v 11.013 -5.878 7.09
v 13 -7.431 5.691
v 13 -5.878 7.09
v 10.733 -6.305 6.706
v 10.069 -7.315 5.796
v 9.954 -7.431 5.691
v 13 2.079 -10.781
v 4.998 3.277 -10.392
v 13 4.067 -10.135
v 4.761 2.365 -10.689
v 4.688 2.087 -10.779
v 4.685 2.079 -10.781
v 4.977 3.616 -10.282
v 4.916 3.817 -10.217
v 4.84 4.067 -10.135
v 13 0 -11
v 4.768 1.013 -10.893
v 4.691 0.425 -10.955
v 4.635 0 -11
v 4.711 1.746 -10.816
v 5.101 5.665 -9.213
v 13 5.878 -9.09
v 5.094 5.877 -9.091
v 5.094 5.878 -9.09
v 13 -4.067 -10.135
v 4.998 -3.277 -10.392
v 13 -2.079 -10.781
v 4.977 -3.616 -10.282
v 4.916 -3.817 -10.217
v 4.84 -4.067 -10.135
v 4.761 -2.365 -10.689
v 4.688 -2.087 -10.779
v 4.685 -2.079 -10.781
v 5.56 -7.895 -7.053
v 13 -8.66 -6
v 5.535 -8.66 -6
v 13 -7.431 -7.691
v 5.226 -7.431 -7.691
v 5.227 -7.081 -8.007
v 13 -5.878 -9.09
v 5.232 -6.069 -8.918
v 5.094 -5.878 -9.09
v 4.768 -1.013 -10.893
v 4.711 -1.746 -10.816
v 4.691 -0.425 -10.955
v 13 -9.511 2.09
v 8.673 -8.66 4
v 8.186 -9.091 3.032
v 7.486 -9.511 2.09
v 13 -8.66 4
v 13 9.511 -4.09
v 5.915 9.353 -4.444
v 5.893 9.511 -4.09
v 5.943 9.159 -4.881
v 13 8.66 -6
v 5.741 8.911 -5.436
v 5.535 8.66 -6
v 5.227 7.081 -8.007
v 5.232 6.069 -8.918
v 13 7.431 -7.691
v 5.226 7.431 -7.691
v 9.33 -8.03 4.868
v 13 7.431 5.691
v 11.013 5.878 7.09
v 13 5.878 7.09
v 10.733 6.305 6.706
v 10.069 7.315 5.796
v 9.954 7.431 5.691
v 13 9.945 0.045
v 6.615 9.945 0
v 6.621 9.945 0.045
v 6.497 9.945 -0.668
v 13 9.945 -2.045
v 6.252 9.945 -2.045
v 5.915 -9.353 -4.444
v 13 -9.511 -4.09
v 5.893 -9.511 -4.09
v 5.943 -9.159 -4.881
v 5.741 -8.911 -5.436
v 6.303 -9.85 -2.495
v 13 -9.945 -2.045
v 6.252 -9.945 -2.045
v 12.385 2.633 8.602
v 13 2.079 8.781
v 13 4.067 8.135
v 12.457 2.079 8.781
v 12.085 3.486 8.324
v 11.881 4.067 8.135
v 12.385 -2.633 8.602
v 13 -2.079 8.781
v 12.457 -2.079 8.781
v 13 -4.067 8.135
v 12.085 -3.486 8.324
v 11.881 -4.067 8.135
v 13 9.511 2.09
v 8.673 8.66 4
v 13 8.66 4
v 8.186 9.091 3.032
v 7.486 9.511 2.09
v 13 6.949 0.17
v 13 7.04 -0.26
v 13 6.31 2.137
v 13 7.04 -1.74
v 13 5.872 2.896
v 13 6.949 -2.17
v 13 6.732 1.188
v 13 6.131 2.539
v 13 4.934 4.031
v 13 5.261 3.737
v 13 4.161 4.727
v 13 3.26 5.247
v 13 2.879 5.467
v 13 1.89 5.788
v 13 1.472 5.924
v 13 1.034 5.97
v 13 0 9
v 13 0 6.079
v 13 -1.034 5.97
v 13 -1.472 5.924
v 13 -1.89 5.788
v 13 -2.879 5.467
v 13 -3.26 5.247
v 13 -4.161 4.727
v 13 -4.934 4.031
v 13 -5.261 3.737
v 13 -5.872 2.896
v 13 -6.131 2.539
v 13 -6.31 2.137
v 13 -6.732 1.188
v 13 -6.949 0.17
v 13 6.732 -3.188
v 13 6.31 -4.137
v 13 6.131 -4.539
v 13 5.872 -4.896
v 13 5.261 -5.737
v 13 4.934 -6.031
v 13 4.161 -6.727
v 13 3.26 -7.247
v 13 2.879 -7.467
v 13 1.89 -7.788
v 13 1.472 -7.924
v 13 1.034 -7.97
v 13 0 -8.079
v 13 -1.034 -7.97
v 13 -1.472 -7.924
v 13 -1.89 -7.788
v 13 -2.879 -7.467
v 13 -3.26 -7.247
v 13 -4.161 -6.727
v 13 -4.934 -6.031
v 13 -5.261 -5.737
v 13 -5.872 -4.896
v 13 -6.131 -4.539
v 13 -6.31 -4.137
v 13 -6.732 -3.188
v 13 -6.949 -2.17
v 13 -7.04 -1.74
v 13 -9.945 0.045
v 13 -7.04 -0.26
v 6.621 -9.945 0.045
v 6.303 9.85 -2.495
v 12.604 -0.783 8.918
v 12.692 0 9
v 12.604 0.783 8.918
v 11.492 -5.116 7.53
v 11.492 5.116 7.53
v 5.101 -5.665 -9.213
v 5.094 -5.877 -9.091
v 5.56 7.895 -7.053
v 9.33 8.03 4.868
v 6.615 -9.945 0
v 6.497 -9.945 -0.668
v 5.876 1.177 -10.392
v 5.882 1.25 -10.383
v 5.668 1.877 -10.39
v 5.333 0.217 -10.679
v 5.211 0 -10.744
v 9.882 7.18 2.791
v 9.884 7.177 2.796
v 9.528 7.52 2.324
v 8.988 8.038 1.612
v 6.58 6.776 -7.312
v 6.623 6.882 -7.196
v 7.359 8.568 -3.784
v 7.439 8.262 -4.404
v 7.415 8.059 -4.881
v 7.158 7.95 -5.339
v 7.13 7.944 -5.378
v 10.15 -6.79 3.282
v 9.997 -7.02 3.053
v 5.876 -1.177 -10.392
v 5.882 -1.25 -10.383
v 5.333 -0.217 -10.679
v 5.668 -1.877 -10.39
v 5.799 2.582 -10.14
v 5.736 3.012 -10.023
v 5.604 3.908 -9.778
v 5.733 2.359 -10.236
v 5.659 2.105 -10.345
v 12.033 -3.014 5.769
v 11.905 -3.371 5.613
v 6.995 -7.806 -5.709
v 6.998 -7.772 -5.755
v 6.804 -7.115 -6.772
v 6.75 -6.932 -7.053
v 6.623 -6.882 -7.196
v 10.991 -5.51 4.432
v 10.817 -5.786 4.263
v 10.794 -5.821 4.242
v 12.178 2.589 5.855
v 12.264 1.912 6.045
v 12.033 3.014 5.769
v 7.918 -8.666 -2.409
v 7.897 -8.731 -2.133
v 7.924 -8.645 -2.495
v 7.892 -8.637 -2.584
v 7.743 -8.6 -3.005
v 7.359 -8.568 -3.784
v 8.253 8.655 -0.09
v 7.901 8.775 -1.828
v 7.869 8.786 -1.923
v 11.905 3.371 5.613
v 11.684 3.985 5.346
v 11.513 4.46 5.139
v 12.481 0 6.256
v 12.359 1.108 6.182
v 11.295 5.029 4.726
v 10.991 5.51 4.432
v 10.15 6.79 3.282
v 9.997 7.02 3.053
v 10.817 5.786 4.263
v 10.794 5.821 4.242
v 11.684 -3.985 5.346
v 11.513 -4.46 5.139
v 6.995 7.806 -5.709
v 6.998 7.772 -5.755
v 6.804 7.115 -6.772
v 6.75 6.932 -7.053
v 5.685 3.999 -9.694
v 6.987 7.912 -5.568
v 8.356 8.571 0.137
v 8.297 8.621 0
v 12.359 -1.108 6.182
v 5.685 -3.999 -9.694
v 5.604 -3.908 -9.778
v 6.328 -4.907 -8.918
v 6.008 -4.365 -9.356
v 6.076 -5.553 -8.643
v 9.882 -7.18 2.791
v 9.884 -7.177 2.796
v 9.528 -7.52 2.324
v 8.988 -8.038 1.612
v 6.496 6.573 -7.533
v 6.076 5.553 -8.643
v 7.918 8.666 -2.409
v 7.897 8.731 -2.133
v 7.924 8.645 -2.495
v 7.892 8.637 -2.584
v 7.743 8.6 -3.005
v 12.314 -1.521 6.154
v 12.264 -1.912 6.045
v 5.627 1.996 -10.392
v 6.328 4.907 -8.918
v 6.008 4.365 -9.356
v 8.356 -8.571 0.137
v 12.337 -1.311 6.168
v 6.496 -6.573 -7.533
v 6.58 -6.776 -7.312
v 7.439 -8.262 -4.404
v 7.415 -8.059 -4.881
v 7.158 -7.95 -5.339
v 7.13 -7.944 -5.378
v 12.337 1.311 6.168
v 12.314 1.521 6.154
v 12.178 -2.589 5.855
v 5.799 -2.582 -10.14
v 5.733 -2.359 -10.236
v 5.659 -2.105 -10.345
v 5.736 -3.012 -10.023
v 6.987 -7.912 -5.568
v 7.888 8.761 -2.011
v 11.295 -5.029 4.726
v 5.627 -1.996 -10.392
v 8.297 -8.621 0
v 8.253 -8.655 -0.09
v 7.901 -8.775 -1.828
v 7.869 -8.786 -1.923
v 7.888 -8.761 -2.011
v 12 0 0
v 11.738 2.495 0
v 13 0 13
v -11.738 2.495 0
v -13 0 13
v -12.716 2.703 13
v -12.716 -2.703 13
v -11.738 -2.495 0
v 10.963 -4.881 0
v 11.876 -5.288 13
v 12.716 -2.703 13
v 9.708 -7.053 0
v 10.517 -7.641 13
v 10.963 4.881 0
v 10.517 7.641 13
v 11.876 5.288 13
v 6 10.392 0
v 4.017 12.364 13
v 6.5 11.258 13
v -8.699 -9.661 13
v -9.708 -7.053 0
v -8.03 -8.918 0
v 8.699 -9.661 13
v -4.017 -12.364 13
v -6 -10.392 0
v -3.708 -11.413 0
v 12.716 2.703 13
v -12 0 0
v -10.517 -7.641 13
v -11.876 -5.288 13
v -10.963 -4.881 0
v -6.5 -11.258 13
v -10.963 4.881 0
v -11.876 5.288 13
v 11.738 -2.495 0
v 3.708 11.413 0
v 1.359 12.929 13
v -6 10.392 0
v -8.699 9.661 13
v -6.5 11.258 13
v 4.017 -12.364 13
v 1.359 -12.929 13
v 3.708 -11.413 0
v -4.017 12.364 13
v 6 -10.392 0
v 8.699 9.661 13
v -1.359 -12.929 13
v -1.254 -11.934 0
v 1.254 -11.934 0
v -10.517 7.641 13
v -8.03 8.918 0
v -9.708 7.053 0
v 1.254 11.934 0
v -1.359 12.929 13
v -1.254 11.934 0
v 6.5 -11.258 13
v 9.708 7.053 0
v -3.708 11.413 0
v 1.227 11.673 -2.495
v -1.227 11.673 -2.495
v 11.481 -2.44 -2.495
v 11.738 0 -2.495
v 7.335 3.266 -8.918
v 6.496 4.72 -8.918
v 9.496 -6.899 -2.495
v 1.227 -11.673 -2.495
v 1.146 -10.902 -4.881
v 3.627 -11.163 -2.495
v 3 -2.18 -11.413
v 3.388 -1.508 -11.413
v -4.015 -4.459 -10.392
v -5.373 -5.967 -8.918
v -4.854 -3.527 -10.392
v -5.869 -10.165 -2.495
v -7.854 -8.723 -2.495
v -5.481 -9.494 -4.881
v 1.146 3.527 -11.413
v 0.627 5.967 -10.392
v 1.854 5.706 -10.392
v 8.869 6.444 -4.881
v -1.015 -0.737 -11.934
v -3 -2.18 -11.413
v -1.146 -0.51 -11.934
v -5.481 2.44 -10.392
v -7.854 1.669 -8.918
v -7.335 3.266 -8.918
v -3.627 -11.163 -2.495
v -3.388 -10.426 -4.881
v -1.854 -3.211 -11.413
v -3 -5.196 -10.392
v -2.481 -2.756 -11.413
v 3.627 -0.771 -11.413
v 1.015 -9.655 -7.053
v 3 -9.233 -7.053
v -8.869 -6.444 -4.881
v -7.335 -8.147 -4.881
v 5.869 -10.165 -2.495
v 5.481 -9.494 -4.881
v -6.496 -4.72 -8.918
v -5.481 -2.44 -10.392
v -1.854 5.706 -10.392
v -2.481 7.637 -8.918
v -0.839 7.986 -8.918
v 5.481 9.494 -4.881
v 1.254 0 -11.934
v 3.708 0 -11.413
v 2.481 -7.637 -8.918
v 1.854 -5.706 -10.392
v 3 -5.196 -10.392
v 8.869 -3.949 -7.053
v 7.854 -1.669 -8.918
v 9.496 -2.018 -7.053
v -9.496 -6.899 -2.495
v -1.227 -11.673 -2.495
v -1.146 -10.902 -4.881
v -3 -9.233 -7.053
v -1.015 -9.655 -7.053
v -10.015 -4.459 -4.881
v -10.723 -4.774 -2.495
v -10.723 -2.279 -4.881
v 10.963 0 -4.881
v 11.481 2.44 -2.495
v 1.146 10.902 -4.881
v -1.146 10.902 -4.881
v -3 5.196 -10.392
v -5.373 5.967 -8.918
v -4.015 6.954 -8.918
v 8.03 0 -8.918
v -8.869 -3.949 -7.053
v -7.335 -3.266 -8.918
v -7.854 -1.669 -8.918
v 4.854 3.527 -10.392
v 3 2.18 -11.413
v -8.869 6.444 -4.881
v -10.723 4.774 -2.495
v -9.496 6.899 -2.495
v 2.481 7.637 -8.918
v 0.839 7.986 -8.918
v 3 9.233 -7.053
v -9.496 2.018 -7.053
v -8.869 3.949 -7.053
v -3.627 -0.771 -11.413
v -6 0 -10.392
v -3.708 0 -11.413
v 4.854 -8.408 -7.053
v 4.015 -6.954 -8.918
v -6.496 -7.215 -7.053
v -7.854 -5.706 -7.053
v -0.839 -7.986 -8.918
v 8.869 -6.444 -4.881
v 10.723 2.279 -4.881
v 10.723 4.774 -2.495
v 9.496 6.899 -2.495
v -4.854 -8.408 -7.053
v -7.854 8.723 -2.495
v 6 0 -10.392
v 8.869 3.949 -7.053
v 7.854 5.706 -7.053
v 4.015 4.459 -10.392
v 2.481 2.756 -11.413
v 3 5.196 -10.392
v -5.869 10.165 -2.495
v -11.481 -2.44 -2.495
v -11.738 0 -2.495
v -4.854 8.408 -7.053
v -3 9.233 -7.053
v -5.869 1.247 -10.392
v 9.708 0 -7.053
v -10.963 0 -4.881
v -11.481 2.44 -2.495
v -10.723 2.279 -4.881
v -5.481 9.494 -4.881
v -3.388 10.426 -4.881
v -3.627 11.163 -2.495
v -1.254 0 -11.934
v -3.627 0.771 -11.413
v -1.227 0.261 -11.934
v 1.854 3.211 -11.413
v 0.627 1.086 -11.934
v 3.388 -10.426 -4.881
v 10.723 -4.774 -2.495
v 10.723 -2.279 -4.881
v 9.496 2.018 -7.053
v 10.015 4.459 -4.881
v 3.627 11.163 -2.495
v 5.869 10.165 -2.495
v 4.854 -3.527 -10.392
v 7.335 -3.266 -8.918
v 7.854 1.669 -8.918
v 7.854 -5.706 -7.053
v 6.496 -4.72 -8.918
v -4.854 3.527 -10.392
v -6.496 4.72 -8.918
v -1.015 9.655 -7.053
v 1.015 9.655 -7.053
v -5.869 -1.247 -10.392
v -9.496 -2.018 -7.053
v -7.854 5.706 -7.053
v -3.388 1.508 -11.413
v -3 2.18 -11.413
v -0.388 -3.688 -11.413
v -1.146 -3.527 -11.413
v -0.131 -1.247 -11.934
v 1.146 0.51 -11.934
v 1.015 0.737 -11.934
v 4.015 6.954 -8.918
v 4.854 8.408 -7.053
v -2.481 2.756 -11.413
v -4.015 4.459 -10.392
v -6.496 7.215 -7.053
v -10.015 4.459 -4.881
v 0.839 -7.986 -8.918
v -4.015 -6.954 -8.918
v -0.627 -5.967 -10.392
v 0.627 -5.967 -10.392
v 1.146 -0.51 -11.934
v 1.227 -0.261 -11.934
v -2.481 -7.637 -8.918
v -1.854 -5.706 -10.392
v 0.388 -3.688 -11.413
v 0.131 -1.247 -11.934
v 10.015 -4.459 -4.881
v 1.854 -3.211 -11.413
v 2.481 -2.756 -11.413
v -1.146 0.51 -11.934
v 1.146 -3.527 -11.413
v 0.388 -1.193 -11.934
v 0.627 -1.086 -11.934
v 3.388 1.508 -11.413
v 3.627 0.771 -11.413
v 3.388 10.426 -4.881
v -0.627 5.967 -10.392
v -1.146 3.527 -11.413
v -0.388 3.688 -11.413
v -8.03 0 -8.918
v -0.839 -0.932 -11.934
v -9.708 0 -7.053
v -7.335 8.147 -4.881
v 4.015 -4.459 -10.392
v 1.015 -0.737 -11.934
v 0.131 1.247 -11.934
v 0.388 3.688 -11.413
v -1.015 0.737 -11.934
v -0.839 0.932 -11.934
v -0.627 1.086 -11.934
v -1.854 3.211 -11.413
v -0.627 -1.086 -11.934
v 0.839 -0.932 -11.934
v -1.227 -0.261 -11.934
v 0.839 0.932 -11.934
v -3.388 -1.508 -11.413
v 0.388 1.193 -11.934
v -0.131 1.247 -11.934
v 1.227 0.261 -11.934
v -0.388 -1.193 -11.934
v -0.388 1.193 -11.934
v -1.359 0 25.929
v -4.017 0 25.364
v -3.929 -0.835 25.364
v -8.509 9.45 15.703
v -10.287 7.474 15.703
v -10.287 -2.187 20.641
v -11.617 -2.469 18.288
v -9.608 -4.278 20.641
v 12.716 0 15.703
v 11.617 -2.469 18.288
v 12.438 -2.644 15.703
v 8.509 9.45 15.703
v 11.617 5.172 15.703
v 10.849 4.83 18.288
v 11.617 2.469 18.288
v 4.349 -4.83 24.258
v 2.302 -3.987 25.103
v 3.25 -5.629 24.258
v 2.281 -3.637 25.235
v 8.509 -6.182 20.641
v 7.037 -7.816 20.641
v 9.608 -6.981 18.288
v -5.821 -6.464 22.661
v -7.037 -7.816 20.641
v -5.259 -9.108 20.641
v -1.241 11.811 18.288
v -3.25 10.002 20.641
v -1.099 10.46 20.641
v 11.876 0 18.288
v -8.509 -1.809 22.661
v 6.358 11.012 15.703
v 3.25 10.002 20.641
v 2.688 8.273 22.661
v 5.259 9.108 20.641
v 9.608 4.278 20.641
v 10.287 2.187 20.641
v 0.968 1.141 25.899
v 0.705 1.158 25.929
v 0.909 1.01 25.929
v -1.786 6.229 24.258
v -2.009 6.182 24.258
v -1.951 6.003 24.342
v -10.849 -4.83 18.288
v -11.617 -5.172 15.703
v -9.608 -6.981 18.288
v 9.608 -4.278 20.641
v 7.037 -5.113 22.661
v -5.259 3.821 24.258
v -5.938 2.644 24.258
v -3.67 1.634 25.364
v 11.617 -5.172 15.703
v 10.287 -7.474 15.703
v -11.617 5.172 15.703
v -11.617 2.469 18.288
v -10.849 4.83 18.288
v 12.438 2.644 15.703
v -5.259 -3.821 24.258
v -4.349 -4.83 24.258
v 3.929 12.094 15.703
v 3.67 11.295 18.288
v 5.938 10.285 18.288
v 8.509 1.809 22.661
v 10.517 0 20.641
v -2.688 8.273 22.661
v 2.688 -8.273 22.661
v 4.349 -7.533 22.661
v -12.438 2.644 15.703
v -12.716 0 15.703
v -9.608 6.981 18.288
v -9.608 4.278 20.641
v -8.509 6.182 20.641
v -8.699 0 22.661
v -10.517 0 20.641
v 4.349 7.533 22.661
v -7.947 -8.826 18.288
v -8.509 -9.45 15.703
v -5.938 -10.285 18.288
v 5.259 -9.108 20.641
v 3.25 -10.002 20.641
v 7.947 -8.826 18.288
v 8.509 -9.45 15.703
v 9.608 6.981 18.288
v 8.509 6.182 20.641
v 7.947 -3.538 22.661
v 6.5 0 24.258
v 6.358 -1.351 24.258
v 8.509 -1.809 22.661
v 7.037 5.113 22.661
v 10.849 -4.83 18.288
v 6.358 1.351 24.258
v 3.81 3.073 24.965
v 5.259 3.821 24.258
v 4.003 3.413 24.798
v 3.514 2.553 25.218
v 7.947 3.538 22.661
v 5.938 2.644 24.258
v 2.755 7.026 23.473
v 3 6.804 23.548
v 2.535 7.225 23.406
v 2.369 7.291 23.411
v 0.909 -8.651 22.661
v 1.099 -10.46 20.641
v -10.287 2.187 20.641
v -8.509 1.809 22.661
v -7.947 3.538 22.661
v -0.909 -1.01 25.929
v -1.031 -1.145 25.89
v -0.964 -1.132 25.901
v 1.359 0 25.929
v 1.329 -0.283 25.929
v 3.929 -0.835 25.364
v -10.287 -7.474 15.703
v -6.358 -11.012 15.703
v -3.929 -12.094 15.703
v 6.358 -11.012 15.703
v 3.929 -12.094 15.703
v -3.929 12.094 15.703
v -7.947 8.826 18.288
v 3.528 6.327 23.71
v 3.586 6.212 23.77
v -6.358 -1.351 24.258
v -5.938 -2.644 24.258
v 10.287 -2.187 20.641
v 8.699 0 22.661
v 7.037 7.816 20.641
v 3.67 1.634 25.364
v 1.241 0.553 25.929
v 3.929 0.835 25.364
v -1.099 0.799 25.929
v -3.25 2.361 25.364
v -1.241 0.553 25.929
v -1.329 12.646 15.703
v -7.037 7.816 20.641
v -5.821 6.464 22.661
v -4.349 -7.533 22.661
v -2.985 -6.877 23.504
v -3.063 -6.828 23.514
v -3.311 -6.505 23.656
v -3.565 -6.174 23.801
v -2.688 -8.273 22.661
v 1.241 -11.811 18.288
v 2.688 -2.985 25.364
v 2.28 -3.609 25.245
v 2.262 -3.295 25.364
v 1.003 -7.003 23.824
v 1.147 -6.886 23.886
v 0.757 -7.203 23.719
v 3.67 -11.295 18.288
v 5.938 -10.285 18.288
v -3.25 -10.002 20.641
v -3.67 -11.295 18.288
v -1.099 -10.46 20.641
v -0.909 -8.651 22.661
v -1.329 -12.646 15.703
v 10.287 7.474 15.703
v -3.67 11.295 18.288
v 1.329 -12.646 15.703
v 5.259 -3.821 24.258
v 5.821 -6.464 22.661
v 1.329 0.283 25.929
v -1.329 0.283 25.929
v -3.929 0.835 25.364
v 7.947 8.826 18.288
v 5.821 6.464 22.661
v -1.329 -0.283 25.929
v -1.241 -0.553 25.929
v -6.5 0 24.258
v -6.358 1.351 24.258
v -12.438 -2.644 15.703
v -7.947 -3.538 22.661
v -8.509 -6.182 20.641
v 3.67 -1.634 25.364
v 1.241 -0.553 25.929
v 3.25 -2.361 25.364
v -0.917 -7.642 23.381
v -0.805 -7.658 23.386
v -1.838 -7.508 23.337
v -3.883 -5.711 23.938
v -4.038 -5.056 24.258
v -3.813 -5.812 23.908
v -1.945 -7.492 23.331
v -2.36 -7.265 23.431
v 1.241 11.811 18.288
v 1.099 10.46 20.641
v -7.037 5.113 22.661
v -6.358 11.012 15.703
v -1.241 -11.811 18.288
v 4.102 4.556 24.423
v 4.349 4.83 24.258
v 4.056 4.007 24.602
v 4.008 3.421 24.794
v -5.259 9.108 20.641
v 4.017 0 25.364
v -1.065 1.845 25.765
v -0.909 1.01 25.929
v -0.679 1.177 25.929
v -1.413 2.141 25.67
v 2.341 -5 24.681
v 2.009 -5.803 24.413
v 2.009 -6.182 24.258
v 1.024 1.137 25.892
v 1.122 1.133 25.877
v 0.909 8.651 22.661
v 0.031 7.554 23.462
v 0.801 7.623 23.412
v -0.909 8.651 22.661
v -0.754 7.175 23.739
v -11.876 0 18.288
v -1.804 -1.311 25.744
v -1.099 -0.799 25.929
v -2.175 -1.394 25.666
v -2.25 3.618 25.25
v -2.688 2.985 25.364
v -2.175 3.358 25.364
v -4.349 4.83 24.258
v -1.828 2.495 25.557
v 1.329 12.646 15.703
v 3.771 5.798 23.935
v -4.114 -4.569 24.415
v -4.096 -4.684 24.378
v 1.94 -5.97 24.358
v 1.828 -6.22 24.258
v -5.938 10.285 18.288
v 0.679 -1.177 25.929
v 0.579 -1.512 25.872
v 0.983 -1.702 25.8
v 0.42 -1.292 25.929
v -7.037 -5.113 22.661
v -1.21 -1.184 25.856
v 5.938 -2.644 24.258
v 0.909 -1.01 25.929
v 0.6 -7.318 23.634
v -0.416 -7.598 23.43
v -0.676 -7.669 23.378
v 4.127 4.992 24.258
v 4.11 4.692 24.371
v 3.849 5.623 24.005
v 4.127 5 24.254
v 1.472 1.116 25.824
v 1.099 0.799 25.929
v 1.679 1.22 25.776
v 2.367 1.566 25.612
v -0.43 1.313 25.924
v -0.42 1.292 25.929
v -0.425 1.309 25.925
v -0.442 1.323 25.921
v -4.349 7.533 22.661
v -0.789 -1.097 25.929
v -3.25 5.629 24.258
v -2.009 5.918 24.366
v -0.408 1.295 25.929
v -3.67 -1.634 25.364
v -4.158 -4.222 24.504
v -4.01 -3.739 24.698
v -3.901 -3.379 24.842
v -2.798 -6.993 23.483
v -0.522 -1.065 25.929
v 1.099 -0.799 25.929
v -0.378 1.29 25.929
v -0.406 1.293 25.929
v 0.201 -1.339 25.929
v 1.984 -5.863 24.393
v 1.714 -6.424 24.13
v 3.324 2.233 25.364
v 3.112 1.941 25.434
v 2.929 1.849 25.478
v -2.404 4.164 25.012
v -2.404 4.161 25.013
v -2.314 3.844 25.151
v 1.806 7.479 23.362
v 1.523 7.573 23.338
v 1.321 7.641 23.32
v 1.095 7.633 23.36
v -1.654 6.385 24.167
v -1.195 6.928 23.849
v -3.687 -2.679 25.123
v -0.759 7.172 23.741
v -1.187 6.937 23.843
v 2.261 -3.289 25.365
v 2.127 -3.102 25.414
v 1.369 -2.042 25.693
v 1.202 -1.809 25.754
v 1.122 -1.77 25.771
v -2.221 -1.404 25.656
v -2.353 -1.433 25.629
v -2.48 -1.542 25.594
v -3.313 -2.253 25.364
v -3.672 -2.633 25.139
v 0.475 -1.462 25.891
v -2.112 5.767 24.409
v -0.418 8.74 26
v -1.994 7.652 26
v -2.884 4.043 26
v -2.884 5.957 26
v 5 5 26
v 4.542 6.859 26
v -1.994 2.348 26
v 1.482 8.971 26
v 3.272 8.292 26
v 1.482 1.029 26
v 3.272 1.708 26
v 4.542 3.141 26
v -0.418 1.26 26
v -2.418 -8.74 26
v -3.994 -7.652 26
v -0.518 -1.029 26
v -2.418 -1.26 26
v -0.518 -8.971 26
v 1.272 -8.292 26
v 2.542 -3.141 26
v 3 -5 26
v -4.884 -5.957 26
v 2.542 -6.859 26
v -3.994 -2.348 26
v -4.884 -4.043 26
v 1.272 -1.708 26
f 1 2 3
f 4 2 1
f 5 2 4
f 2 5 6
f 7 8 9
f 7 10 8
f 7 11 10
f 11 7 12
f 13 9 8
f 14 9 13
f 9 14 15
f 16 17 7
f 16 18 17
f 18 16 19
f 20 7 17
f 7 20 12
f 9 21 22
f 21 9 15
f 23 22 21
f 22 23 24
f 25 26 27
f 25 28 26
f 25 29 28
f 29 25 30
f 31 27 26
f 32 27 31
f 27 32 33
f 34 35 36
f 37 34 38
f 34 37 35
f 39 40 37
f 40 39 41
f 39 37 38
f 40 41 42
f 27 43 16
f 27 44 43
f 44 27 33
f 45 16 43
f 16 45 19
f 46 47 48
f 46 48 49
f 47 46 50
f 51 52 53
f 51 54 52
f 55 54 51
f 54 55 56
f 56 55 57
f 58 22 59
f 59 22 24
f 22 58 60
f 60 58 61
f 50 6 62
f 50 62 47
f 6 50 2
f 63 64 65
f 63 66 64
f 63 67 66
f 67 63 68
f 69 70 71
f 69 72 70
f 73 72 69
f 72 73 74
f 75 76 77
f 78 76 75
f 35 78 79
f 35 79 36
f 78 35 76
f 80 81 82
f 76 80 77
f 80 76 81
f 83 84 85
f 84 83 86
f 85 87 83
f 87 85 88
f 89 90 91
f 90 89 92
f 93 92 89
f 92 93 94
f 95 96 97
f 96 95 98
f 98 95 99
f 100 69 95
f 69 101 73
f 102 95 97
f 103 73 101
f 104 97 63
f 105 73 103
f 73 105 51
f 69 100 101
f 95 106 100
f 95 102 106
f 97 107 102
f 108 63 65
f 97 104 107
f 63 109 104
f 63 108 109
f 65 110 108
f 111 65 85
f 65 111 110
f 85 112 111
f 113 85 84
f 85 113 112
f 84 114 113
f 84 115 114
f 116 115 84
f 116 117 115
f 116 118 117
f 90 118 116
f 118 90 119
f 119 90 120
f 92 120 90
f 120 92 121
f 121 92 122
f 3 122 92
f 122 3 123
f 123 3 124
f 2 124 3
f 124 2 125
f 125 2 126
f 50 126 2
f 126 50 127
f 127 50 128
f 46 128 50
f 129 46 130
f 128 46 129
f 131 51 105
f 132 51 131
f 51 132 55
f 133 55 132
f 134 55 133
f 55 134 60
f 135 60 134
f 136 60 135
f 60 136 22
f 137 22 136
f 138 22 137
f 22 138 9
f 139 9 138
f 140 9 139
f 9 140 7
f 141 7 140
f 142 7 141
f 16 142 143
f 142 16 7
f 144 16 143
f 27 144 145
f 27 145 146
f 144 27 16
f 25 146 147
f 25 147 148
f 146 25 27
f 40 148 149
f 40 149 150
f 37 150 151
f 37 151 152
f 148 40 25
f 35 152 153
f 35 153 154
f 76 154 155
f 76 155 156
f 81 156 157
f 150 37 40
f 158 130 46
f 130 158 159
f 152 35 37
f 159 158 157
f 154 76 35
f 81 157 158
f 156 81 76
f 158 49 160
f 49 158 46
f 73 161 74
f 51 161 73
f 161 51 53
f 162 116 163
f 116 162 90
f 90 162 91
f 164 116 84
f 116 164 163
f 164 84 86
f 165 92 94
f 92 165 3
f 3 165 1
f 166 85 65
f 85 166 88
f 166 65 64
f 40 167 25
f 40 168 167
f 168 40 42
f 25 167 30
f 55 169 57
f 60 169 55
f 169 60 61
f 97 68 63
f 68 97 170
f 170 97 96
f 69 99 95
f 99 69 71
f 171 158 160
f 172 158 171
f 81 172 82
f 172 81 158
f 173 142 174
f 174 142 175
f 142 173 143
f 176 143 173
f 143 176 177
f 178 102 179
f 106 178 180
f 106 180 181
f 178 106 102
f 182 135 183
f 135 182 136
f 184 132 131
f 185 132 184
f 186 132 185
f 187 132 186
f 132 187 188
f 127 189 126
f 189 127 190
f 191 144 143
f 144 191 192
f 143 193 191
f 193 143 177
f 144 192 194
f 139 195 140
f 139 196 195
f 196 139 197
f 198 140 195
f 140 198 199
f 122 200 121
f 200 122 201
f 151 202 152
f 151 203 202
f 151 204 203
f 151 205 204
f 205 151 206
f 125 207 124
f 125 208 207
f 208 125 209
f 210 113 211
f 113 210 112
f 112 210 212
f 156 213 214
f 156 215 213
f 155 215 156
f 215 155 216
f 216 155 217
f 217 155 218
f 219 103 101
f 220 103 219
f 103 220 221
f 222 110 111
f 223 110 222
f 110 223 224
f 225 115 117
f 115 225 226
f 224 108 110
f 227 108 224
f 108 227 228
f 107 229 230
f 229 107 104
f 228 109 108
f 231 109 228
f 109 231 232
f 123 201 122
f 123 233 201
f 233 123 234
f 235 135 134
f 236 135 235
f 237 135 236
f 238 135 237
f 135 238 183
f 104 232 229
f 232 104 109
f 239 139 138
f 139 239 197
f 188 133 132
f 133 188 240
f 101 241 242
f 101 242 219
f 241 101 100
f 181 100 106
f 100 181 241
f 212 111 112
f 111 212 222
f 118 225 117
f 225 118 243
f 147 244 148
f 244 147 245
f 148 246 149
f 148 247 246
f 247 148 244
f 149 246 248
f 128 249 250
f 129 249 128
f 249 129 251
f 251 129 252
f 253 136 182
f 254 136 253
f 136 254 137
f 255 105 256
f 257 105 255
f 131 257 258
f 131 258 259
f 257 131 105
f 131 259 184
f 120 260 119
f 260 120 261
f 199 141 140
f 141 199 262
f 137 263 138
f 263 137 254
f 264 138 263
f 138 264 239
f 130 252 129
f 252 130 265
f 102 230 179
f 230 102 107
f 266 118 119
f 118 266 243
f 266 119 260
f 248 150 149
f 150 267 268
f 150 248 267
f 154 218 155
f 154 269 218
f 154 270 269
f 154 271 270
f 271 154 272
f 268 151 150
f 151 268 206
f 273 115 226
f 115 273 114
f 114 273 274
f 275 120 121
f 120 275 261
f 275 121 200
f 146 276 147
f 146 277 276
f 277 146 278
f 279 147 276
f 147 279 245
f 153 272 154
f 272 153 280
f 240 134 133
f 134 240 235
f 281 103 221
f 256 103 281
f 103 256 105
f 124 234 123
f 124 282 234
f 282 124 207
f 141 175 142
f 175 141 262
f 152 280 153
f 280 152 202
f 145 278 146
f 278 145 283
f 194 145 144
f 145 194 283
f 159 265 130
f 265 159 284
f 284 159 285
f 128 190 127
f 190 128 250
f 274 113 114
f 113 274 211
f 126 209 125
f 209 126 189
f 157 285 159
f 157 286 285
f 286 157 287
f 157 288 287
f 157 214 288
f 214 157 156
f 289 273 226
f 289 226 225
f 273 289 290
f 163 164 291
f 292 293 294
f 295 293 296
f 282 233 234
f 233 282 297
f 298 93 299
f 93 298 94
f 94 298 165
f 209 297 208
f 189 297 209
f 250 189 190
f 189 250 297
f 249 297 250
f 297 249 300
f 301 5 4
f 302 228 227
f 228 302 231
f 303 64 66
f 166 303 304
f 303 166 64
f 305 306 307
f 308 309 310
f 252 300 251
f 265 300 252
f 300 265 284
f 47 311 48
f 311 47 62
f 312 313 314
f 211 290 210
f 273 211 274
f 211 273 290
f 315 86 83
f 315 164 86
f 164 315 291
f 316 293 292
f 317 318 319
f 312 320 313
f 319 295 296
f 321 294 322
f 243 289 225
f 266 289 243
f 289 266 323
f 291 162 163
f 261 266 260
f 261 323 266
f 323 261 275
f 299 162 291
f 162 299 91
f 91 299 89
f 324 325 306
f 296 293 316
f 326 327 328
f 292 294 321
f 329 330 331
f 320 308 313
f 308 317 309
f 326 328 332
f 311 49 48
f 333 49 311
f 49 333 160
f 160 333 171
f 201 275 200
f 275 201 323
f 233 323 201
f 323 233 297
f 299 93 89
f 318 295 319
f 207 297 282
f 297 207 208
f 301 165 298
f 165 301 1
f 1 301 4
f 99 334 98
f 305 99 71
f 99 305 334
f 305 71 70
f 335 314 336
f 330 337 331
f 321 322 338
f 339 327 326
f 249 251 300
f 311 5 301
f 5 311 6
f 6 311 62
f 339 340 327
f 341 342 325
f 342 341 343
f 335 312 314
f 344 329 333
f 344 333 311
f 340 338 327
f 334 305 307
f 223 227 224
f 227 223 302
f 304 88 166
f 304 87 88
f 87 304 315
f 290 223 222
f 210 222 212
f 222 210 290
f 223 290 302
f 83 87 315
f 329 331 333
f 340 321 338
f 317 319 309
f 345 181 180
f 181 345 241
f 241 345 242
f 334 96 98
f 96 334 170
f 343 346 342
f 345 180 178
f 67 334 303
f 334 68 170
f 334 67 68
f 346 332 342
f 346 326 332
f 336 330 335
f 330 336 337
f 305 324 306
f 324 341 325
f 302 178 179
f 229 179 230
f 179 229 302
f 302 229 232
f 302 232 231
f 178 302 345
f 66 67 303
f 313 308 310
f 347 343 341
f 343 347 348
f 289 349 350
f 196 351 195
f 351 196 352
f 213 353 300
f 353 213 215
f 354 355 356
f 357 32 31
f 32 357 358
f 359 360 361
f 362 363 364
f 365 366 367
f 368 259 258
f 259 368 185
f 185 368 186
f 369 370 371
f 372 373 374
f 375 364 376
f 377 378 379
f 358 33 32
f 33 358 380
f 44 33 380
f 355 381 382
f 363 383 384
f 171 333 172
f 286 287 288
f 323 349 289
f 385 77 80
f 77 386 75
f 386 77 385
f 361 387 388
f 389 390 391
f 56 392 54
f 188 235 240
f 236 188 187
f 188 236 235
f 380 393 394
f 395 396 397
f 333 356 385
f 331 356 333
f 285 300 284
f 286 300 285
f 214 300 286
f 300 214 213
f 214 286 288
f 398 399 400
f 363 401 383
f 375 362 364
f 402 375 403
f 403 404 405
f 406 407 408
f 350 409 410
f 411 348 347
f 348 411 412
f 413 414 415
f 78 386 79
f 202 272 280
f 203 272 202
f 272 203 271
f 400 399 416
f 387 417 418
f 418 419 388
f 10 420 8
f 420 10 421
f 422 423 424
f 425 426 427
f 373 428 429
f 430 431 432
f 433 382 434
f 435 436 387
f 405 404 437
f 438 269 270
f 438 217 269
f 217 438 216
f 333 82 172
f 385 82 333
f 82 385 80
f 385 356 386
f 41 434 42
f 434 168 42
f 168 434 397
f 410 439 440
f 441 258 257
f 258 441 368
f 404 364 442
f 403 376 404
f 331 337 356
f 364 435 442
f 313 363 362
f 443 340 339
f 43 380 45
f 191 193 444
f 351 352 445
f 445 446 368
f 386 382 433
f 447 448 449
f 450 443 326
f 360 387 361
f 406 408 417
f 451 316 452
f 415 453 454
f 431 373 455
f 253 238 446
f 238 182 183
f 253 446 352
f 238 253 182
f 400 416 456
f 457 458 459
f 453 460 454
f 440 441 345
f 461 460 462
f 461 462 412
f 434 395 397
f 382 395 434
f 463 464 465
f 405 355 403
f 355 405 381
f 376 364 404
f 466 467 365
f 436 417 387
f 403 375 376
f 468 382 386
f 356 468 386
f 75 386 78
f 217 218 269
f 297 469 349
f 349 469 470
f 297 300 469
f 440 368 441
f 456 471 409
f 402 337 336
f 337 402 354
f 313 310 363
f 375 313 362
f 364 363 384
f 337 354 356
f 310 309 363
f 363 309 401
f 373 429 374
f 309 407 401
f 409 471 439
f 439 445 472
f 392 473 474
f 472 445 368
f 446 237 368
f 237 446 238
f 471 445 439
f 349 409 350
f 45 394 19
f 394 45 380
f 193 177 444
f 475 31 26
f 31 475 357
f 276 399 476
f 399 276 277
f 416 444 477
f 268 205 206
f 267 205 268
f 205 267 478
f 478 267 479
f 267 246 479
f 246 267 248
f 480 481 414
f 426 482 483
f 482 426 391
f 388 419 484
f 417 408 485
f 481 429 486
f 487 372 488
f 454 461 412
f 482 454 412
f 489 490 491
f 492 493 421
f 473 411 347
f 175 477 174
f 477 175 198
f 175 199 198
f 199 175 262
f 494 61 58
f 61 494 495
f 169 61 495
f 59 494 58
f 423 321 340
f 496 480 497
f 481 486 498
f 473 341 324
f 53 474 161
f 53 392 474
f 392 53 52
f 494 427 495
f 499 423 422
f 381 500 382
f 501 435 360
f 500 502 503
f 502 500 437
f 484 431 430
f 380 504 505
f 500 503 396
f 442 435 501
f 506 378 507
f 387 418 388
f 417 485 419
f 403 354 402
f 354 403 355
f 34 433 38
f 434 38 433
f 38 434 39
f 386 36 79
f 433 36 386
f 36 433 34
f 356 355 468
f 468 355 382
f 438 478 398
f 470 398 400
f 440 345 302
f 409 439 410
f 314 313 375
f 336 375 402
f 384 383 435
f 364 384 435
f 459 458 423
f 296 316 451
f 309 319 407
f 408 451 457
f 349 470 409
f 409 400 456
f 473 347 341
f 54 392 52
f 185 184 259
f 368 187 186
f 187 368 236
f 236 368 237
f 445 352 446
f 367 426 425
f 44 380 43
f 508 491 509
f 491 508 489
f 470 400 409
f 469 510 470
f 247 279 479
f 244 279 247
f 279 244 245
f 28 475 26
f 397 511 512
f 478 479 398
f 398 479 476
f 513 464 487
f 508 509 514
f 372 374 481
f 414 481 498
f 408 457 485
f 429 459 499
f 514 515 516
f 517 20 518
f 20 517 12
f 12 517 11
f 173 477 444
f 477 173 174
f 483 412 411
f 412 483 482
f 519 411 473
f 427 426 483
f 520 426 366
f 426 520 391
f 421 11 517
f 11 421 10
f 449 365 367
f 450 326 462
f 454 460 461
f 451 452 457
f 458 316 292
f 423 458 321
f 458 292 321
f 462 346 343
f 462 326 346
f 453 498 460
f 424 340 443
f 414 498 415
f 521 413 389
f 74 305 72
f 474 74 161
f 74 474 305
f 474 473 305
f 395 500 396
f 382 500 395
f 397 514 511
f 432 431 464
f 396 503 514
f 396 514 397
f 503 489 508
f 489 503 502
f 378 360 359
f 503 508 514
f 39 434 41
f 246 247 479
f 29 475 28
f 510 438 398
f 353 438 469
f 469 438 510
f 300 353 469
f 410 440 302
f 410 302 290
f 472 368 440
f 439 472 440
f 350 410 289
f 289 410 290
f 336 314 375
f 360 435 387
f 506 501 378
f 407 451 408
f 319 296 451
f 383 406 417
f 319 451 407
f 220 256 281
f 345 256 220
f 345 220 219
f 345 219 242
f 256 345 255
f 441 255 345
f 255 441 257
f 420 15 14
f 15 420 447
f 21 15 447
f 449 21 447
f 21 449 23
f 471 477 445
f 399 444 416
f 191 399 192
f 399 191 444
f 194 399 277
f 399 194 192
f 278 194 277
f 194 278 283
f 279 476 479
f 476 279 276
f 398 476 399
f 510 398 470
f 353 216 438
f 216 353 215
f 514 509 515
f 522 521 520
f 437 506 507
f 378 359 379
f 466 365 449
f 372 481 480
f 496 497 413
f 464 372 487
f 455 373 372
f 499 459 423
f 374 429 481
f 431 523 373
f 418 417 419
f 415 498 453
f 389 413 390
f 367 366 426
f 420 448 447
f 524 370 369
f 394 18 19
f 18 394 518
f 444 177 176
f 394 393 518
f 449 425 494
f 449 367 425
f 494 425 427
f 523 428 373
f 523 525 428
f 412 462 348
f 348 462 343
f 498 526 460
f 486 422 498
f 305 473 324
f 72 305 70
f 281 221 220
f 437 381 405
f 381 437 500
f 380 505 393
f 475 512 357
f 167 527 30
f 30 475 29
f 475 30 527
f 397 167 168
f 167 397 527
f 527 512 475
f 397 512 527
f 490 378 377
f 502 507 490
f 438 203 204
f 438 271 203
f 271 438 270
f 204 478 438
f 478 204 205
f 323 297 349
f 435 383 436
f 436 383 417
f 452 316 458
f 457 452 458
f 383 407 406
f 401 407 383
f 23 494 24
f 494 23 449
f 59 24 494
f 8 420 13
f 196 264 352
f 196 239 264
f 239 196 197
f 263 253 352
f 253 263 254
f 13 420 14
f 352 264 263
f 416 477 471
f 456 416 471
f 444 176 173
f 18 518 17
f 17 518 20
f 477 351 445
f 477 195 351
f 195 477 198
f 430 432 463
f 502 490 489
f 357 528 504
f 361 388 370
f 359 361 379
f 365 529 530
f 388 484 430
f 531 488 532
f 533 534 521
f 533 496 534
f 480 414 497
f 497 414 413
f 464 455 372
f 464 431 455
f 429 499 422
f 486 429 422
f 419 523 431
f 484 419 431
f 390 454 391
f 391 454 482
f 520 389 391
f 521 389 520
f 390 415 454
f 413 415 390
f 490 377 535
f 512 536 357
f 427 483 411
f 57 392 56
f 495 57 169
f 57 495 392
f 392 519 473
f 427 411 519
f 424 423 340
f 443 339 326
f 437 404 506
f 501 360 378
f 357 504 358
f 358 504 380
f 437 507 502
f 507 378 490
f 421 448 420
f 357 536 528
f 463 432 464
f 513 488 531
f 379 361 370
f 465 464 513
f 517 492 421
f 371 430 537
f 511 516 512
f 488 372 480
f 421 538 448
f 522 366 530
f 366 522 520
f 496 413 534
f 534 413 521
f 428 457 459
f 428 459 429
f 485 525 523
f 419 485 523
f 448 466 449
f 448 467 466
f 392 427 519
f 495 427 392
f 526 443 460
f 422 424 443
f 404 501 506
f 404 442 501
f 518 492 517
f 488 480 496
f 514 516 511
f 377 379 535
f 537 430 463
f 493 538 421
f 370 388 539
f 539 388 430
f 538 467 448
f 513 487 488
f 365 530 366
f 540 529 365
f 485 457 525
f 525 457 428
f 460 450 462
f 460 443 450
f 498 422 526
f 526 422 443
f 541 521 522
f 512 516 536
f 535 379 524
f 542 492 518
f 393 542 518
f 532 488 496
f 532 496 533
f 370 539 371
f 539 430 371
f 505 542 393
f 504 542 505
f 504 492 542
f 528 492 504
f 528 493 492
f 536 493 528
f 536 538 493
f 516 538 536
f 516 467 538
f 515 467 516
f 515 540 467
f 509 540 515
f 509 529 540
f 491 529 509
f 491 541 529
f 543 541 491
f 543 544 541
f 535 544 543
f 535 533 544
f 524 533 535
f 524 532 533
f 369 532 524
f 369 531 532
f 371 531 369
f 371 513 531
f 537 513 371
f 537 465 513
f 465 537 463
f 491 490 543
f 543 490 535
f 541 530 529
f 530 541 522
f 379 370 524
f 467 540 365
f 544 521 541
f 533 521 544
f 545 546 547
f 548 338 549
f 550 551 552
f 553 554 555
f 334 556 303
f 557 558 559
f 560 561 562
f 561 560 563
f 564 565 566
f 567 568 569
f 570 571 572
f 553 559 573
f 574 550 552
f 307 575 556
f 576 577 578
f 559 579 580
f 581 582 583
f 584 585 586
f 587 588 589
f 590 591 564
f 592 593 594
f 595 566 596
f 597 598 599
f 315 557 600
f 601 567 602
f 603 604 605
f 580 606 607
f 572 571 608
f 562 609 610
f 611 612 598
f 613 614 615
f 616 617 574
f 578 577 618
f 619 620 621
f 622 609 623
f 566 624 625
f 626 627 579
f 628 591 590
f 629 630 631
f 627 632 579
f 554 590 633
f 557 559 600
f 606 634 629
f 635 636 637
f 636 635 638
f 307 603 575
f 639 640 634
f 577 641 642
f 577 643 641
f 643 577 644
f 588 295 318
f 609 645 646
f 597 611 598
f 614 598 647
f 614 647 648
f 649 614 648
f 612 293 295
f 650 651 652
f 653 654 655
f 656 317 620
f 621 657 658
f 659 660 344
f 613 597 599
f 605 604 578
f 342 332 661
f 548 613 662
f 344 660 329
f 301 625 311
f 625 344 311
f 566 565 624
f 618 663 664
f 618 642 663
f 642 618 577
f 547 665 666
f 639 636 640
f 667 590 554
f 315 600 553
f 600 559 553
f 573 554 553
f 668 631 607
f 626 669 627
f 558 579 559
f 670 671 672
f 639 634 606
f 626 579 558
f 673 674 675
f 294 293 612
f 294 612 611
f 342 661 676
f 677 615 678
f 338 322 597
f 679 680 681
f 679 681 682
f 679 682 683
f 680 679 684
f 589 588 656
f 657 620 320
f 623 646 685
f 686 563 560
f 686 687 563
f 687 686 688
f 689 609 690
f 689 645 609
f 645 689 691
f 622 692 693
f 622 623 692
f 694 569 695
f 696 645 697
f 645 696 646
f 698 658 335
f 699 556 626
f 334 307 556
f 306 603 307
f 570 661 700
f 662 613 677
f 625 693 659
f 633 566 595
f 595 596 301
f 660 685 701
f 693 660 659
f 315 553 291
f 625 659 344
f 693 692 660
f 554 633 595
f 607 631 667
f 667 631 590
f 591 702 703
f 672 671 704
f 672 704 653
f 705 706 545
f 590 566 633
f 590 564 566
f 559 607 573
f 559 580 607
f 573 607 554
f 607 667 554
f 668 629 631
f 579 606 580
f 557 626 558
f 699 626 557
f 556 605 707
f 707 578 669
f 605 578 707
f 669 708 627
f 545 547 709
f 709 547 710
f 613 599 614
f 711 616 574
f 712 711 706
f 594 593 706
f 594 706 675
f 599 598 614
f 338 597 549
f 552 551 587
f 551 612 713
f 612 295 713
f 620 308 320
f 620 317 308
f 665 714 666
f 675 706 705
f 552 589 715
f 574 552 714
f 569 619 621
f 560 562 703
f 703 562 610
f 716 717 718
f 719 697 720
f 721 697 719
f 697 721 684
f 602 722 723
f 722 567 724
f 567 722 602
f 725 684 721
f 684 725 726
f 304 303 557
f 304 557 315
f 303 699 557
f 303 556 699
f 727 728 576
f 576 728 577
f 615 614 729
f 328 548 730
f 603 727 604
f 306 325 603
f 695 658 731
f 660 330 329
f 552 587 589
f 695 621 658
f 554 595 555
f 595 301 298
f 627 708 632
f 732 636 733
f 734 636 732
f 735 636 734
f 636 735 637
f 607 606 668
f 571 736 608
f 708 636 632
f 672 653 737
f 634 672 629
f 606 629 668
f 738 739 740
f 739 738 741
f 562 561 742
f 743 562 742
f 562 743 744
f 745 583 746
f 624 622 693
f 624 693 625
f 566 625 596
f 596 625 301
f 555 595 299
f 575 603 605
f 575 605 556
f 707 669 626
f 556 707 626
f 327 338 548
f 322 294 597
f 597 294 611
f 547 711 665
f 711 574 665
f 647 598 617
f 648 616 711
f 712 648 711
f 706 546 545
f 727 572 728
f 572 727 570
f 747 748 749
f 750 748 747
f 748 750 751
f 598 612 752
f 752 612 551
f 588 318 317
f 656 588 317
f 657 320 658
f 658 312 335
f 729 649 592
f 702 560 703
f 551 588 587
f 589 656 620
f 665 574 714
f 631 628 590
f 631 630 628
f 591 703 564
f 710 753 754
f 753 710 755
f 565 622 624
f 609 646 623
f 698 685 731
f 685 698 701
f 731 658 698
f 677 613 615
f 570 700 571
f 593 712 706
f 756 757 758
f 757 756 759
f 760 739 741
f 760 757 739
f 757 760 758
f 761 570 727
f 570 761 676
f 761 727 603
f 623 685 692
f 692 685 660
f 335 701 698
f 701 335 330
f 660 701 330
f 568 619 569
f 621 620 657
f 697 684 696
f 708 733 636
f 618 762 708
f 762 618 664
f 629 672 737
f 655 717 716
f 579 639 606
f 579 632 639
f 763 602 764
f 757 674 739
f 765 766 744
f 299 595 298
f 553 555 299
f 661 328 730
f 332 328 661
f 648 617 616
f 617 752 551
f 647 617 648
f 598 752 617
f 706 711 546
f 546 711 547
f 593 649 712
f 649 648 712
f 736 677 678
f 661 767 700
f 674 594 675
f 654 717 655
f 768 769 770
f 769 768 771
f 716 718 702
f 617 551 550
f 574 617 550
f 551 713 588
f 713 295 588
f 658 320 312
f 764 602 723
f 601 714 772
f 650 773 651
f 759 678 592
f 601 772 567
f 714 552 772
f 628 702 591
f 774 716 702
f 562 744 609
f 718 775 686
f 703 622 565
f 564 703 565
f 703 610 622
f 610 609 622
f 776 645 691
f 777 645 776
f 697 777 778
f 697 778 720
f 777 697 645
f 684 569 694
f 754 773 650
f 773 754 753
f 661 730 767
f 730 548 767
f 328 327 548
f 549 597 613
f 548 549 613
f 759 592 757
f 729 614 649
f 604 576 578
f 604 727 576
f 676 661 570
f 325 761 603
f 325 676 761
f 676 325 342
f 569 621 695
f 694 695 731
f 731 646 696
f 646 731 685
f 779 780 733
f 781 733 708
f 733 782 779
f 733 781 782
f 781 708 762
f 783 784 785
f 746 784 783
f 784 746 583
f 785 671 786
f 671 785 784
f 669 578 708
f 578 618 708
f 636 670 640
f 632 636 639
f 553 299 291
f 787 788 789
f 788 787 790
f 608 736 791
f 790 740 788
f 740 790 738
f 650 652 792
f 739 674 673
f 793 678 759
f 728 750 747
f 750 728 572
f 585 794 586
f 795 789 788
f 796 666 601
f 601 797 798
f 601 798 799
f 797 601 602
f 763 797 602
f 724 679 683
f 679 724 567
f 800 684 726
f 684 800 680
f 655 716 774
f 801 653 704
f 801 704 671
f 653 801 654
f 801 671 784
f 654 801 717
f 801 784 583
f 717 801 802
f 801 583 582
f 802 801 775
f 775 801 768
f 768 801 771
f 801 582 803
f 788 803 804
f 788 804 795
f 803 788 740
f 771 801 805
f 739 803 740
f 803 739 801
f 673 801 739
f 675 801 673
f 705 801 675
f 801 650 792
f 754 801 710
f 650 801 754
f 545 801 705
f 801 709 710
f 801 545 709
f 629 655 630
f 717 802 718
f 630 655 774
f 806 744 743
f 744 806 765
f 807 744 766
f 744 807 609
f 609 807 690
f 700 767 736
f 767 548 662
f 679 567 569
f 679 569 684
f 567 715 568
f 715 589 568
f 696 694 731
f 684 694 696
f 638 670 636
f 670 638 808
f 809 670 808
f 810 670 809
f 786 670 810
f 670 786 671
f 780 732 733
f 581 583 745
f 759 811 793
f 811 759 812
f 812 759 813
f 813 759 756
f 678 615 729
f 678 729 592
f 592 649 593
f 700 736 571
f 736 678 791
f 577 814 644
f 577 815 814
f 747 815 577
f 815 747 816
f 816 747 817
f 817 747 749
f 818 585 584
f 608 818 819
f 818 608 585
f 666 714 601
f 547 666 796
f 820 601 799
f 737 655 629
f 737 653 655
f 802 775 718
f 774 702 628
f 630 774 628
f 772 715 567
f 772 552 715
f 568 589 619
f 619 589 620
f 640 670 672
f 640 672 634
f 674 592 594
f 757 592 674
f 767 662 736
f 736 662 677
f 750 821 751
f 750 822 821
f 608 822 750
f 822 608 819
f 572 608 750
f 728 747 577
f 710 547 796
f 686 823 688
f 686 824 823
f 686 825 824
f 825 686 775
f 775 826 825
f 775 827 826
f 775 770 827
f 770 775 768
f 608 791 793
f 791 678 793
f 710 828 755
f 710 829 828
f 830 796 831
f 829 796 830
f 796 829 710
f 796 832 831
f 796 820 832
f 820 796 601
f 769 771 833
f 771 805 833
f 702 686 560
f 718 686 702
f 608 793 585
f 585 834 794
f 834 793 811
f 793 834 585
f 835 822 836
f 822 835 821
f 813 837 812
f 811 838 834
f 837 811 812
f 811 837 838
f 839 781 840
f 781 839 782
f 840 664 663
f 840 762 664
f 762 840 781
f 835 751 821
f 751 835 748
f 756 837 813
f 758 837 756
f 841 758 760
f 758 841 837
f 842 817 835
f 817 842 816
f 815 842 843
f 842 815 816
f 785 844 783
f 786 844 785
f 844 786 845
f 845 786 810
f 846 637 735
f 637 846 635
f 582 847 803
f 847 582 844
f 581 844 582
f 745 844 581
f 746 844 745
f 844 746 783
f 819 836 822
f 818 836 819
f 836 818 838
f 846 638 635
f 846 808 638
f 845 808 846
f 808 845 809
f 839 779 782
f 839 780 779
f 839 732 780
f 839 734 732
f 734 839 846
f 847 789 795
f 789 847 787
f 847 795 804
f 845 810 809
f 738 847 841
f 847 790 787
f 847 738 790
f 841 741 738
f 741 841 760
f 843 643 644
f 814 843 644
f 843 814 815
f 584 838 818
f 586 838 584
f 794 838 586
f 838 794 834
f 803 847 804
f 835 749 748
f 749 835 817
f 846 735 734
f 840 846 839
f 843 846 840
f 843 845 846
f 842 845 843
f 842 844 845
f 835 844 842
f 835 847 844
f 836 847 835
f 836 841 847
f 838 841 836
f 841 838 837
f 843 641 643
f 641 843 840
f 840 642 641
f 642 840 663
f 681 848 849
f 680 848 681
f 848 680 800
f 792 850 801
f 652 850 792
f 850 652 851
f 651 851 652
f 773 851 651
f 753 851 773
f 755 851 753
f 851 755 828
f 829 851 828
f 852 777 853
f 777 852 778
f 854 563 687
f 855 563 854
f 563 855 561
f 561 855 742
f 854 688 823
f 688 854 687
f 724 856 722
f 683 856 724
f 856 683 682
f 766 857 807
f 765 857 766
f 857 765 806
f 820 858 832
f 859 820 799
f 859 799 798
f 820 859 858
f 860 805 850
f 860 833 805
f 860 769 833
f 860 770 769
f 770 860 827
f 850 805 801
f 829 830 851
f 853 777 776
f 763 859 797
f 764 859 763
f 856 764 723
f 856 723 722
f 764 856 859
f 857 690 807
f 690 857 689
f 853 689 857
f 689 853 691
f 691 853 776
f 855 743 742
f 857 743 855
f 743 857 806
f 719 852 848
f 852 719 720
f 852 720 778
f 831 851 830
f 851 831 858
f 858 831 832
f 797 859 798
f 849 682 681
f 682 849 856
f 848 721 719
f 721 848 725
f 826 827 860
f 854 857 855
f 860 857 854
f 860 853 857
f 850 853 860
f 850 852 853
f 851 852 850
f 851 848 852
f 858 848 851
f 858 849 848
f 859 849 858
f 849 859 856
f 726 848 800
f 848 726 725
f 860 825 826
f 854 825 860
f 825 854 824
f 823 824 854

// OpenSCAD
cylinder(13, 12, 13);
sphere(12);
sphere(10);
translate([0, 0, 13])
sphere(13);
translate([0, 0, 12])
cylinder(10, 10, 5);
translate ([3, 0, -1])
rotate([90, 90, 90])
difference (){
cylinder(10, 10, 10);
cylinder(19, 10.5, 4);
}
sphere(11);
translate([1, 5, 23])
cylinder(3, 2.5, 4);
translate([-1, -5, 23])
cylinder(3, 2.5, 4);
